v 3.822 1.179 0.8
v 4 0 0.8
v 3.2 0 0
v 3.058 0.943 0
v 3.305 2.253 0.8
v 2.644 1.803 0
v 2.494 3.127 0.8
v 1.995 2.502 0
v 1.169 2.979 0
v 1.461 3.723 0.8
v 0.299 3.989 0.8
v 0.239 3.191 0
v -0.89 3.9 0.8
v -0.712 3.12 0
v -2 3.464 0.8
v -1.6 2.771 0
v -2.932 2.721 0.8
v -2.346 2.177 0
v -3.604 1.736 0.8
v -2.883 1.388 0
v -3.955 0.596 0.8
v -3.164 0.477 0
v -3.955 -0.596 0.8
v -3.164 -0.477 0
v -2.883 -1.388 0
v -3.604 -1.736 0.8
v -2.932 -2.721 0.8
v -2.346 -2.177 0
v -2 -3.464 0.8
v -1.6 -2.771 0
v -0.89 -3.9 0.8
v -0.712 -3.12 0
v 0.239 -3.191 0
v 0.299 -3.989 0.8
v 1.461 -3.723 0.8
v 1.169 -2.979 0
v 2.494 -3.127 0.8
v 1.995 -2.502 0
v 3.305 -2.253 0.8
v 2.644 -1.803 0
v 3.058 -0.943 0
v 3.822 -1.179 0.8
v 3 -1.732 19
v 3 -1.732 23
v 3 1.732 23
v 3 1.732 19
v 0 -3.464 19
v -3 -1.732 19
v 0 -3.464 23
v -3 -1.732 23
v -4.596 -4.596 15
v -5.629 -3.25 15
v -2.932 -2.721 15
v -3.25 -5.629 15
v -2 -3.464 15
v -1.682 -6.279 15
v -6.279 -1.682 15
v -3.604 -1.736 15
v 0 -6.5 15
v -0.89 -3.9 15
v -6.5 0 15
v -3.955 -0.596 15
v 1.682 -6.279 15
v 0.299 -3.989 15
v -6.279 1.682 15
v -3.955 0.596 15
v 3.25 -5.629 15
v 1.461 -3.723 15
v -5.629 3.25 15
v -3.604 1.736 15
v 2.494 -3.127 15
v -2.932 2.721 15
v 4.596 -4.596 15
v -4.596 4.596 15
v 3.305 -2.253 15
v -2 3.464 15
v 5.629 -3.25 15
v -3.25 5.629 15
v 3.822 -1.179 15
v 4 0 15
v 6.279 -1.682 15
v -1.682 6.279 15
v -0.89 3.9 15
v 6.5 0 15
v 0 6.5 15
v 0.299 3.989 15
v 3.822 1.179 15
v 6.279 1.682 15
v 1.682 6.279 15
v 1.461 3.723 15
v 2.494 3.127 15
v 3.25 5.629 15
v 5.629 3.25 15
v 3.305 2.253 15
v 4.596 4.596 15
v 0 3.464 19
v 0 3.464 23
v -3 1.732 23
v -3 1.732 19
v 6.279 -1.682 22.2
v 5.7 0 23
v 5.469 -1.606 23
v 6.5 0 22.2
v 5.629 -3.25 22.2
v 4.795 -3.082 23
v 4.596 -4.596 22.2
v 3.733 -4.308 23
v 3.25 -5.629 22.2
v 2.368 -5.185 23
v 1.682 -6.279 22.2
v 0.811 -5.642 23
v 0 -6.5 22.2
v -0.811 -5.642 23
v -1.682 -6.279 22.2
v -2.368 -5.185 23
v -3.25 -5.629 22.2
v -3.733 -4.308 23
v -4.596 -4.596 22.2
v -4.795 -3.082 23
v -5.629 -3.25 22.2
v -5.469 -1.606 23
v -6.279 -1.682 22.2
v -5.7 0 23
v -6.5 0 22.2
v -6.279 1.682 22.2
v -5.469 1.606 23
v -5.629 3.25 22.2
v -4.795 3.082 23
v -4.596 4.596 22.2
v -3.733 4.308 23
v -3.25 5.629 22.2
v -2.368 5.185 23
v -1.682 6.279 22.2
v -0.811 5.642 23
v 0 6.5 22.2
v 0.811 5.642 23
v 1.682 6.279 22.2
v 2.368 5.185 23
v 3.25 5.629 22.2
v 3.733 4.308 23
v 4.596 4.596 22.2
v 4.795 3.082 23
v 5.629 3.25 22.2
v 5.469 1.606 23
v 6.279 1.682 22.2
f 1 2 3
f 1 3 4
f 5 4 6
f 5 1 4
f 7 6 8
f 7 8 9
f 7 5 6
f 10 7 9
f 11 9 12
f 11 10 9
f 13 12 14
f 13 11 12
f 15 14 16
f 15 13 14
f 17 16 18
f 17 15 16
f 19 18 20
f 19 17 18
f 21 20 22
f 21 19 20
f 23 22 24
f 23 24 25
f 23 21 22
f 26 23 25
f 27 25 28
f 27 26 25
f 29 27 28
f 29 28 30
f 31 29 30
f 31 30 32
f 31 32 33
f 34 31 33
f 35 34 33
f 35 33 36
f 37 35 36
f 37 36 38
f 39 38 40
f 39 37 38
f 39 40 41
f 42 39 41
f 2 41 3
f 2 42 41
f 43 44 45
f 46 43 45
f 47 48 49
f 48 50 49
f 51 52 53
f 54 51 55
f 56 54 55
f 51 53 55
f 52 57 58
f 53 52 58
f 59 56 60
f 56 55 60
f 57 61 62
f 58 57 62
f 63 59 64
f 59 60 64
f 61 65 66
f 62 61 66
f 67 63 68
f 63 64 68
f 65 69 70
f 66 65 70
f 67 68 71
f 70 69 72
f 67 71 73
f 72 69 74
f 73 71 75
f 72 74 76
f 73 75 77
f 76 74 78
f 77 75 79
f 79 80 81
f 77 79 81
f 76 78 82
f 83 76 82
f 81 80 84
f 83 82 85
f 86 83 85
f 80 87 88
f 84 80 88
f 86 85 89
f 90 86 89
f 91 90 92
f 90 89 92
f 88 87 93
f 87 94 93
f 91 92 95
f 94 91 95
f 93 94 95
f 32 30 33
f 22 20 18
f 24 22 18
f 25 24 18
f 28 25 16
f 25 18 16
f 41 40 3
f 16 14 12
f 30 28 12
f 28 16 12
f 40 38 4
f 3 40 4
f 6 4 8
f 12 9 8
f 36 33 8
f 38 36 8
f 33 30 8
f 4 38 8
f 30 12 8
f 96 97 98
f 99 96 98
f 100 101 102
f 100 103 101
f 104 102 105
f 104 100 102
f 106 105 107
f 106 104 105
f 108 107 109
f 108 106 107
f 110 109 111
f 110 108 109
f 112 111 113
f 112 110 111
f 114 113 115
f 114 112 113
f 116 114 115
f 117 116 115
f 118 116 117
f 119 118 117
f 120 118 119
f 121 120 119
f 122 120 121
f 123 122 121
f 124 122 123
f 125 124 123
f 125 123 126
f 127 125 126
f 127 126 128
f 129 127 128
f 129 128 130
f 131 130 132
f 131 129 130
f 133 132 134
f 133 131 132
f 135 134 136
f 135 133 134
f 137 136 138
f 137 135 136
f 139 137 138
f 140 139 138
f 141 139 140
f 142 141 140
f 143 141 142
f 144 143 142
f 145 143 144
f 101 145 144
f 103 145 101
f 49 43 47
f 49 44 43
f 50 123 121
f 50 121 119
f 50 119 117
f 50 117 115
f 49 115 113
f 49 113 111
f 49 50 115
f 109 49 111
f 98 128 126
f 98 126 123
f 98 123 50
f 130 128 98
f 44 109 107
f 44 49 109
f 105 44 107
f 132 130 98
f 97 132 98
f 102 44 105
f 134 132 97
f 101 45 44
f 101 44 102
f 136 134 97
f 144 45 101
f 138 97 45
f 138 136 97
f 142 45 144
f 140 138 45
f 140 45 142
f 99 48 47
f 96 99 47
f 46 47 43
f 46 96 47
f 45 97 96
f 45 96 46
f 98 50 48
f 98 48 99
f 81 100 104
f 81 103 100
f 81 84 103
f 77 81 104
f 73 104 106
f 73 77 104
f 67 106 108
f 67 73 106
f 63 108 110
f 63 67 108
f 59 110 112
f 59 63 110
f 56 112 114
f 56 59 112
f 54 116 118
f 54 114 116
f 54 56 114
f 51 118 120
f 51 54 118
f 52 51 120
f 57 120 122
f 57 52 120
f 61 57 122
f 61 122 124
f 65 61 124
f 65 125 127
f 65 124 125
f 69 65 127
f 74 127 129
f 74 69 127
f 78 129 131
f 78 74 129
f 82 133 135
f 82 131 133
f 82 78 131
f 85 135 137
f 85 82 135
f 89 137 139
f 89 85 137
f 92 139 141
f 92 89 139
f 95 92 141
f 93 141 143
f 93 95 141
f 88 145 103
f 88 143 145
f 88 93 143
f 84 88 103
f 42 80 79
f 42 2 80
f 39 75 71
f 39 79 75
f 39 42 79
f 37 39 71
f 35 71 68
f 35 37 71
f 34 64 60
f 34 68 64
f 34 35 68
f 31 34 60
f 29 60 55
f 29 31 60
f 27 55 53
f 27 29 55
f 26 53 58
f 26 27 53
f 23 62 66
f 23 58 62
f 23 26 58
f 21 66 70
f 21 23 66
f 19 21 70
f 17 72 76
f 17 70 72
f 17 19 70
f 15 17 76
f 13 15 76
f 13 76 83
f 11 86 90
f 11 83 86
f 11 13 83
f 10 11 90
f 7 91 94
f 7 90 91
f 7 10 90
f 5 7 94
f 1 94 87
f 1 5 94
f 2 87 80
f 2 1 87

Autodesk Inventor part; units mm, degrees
ref_plane "YZ Plane" through (0, 0, 0) normal (1, 0, 0) x (0, 1, 0)
ref_plane "XZ Plane" through (0, 0, 0) normal (0, 1, 0) x (-1, 0, 0)
ref_plane "XY Plane" through (0, 0, 0) normal (0, 0, 1) x (1, 0, 0)
sketch "Sketch1" plane through (0, 0, 0) normal (0, 0, 1) x (1, 0, 0)
  circle A0 centre (0, 0) radius 4
  dimension "Diameter" = 8
extrude "Extrusion1" add sketch "Sketch1" along normal blind 15
sketch "Sketch2" plane through (0, 0, 15) normal (0, 0, 1) x (1, 0, 0)
  circle A0 centre (0, 0) radius 4 projected
  circle A1 centre (0, 0) radius 6.5
  dimension "Head_Diameter" = 13
extrude "Extrusion2" add sketch "Sketch2" along normal blind 8 contours A0 | A1
sketch "Sketch3" plane through (0, 0, 23) normal (0, 0, 1) x (1, 0, 0)
  circle A0 centre (0, 0) radius 6.5 projected
  circle A1 centre (0, 0) radius 3.4641 construction
  line L0 (0, 3.4641) -> (3, 1.7321)
  line L1 (3, -1.7321) -> (3, 1.7321)
  line L2 (0, 3.4641) -> (-3, 1.7321)
  line L3 (-3, -1.7321) -> (-3, 1.7321)
  line L4 (-3, -1.7321) -> (0, -3.4641)
  line L5 (3, -1.7321) -> (0, -3.4641)
  dimension "Hex_Width" = 6
extrude "Extrusion3" cut sketch "Sketch3" against normal blind 4 contours L0 L1 L5 L4 L3 L2
thread "Thread1" size "M8x1.25" class "4g6g" standard "ANSI Metric M Profile" length 15
chamfer "Chamfer1" distance 0.8 angle 45 2 edges at (-6.5, 0, 23) (-4, 0, 0)
equation "\"d9\" = ThreadLength"
equation "\"d12\" = Chamfer"
equation "\"ThreadLength\" = 15"
equation "\"Chamfer\" = 0.8"
properties part number "SCREW, SOCKET HD, P, 12.9, M8X1.25X15MM"
